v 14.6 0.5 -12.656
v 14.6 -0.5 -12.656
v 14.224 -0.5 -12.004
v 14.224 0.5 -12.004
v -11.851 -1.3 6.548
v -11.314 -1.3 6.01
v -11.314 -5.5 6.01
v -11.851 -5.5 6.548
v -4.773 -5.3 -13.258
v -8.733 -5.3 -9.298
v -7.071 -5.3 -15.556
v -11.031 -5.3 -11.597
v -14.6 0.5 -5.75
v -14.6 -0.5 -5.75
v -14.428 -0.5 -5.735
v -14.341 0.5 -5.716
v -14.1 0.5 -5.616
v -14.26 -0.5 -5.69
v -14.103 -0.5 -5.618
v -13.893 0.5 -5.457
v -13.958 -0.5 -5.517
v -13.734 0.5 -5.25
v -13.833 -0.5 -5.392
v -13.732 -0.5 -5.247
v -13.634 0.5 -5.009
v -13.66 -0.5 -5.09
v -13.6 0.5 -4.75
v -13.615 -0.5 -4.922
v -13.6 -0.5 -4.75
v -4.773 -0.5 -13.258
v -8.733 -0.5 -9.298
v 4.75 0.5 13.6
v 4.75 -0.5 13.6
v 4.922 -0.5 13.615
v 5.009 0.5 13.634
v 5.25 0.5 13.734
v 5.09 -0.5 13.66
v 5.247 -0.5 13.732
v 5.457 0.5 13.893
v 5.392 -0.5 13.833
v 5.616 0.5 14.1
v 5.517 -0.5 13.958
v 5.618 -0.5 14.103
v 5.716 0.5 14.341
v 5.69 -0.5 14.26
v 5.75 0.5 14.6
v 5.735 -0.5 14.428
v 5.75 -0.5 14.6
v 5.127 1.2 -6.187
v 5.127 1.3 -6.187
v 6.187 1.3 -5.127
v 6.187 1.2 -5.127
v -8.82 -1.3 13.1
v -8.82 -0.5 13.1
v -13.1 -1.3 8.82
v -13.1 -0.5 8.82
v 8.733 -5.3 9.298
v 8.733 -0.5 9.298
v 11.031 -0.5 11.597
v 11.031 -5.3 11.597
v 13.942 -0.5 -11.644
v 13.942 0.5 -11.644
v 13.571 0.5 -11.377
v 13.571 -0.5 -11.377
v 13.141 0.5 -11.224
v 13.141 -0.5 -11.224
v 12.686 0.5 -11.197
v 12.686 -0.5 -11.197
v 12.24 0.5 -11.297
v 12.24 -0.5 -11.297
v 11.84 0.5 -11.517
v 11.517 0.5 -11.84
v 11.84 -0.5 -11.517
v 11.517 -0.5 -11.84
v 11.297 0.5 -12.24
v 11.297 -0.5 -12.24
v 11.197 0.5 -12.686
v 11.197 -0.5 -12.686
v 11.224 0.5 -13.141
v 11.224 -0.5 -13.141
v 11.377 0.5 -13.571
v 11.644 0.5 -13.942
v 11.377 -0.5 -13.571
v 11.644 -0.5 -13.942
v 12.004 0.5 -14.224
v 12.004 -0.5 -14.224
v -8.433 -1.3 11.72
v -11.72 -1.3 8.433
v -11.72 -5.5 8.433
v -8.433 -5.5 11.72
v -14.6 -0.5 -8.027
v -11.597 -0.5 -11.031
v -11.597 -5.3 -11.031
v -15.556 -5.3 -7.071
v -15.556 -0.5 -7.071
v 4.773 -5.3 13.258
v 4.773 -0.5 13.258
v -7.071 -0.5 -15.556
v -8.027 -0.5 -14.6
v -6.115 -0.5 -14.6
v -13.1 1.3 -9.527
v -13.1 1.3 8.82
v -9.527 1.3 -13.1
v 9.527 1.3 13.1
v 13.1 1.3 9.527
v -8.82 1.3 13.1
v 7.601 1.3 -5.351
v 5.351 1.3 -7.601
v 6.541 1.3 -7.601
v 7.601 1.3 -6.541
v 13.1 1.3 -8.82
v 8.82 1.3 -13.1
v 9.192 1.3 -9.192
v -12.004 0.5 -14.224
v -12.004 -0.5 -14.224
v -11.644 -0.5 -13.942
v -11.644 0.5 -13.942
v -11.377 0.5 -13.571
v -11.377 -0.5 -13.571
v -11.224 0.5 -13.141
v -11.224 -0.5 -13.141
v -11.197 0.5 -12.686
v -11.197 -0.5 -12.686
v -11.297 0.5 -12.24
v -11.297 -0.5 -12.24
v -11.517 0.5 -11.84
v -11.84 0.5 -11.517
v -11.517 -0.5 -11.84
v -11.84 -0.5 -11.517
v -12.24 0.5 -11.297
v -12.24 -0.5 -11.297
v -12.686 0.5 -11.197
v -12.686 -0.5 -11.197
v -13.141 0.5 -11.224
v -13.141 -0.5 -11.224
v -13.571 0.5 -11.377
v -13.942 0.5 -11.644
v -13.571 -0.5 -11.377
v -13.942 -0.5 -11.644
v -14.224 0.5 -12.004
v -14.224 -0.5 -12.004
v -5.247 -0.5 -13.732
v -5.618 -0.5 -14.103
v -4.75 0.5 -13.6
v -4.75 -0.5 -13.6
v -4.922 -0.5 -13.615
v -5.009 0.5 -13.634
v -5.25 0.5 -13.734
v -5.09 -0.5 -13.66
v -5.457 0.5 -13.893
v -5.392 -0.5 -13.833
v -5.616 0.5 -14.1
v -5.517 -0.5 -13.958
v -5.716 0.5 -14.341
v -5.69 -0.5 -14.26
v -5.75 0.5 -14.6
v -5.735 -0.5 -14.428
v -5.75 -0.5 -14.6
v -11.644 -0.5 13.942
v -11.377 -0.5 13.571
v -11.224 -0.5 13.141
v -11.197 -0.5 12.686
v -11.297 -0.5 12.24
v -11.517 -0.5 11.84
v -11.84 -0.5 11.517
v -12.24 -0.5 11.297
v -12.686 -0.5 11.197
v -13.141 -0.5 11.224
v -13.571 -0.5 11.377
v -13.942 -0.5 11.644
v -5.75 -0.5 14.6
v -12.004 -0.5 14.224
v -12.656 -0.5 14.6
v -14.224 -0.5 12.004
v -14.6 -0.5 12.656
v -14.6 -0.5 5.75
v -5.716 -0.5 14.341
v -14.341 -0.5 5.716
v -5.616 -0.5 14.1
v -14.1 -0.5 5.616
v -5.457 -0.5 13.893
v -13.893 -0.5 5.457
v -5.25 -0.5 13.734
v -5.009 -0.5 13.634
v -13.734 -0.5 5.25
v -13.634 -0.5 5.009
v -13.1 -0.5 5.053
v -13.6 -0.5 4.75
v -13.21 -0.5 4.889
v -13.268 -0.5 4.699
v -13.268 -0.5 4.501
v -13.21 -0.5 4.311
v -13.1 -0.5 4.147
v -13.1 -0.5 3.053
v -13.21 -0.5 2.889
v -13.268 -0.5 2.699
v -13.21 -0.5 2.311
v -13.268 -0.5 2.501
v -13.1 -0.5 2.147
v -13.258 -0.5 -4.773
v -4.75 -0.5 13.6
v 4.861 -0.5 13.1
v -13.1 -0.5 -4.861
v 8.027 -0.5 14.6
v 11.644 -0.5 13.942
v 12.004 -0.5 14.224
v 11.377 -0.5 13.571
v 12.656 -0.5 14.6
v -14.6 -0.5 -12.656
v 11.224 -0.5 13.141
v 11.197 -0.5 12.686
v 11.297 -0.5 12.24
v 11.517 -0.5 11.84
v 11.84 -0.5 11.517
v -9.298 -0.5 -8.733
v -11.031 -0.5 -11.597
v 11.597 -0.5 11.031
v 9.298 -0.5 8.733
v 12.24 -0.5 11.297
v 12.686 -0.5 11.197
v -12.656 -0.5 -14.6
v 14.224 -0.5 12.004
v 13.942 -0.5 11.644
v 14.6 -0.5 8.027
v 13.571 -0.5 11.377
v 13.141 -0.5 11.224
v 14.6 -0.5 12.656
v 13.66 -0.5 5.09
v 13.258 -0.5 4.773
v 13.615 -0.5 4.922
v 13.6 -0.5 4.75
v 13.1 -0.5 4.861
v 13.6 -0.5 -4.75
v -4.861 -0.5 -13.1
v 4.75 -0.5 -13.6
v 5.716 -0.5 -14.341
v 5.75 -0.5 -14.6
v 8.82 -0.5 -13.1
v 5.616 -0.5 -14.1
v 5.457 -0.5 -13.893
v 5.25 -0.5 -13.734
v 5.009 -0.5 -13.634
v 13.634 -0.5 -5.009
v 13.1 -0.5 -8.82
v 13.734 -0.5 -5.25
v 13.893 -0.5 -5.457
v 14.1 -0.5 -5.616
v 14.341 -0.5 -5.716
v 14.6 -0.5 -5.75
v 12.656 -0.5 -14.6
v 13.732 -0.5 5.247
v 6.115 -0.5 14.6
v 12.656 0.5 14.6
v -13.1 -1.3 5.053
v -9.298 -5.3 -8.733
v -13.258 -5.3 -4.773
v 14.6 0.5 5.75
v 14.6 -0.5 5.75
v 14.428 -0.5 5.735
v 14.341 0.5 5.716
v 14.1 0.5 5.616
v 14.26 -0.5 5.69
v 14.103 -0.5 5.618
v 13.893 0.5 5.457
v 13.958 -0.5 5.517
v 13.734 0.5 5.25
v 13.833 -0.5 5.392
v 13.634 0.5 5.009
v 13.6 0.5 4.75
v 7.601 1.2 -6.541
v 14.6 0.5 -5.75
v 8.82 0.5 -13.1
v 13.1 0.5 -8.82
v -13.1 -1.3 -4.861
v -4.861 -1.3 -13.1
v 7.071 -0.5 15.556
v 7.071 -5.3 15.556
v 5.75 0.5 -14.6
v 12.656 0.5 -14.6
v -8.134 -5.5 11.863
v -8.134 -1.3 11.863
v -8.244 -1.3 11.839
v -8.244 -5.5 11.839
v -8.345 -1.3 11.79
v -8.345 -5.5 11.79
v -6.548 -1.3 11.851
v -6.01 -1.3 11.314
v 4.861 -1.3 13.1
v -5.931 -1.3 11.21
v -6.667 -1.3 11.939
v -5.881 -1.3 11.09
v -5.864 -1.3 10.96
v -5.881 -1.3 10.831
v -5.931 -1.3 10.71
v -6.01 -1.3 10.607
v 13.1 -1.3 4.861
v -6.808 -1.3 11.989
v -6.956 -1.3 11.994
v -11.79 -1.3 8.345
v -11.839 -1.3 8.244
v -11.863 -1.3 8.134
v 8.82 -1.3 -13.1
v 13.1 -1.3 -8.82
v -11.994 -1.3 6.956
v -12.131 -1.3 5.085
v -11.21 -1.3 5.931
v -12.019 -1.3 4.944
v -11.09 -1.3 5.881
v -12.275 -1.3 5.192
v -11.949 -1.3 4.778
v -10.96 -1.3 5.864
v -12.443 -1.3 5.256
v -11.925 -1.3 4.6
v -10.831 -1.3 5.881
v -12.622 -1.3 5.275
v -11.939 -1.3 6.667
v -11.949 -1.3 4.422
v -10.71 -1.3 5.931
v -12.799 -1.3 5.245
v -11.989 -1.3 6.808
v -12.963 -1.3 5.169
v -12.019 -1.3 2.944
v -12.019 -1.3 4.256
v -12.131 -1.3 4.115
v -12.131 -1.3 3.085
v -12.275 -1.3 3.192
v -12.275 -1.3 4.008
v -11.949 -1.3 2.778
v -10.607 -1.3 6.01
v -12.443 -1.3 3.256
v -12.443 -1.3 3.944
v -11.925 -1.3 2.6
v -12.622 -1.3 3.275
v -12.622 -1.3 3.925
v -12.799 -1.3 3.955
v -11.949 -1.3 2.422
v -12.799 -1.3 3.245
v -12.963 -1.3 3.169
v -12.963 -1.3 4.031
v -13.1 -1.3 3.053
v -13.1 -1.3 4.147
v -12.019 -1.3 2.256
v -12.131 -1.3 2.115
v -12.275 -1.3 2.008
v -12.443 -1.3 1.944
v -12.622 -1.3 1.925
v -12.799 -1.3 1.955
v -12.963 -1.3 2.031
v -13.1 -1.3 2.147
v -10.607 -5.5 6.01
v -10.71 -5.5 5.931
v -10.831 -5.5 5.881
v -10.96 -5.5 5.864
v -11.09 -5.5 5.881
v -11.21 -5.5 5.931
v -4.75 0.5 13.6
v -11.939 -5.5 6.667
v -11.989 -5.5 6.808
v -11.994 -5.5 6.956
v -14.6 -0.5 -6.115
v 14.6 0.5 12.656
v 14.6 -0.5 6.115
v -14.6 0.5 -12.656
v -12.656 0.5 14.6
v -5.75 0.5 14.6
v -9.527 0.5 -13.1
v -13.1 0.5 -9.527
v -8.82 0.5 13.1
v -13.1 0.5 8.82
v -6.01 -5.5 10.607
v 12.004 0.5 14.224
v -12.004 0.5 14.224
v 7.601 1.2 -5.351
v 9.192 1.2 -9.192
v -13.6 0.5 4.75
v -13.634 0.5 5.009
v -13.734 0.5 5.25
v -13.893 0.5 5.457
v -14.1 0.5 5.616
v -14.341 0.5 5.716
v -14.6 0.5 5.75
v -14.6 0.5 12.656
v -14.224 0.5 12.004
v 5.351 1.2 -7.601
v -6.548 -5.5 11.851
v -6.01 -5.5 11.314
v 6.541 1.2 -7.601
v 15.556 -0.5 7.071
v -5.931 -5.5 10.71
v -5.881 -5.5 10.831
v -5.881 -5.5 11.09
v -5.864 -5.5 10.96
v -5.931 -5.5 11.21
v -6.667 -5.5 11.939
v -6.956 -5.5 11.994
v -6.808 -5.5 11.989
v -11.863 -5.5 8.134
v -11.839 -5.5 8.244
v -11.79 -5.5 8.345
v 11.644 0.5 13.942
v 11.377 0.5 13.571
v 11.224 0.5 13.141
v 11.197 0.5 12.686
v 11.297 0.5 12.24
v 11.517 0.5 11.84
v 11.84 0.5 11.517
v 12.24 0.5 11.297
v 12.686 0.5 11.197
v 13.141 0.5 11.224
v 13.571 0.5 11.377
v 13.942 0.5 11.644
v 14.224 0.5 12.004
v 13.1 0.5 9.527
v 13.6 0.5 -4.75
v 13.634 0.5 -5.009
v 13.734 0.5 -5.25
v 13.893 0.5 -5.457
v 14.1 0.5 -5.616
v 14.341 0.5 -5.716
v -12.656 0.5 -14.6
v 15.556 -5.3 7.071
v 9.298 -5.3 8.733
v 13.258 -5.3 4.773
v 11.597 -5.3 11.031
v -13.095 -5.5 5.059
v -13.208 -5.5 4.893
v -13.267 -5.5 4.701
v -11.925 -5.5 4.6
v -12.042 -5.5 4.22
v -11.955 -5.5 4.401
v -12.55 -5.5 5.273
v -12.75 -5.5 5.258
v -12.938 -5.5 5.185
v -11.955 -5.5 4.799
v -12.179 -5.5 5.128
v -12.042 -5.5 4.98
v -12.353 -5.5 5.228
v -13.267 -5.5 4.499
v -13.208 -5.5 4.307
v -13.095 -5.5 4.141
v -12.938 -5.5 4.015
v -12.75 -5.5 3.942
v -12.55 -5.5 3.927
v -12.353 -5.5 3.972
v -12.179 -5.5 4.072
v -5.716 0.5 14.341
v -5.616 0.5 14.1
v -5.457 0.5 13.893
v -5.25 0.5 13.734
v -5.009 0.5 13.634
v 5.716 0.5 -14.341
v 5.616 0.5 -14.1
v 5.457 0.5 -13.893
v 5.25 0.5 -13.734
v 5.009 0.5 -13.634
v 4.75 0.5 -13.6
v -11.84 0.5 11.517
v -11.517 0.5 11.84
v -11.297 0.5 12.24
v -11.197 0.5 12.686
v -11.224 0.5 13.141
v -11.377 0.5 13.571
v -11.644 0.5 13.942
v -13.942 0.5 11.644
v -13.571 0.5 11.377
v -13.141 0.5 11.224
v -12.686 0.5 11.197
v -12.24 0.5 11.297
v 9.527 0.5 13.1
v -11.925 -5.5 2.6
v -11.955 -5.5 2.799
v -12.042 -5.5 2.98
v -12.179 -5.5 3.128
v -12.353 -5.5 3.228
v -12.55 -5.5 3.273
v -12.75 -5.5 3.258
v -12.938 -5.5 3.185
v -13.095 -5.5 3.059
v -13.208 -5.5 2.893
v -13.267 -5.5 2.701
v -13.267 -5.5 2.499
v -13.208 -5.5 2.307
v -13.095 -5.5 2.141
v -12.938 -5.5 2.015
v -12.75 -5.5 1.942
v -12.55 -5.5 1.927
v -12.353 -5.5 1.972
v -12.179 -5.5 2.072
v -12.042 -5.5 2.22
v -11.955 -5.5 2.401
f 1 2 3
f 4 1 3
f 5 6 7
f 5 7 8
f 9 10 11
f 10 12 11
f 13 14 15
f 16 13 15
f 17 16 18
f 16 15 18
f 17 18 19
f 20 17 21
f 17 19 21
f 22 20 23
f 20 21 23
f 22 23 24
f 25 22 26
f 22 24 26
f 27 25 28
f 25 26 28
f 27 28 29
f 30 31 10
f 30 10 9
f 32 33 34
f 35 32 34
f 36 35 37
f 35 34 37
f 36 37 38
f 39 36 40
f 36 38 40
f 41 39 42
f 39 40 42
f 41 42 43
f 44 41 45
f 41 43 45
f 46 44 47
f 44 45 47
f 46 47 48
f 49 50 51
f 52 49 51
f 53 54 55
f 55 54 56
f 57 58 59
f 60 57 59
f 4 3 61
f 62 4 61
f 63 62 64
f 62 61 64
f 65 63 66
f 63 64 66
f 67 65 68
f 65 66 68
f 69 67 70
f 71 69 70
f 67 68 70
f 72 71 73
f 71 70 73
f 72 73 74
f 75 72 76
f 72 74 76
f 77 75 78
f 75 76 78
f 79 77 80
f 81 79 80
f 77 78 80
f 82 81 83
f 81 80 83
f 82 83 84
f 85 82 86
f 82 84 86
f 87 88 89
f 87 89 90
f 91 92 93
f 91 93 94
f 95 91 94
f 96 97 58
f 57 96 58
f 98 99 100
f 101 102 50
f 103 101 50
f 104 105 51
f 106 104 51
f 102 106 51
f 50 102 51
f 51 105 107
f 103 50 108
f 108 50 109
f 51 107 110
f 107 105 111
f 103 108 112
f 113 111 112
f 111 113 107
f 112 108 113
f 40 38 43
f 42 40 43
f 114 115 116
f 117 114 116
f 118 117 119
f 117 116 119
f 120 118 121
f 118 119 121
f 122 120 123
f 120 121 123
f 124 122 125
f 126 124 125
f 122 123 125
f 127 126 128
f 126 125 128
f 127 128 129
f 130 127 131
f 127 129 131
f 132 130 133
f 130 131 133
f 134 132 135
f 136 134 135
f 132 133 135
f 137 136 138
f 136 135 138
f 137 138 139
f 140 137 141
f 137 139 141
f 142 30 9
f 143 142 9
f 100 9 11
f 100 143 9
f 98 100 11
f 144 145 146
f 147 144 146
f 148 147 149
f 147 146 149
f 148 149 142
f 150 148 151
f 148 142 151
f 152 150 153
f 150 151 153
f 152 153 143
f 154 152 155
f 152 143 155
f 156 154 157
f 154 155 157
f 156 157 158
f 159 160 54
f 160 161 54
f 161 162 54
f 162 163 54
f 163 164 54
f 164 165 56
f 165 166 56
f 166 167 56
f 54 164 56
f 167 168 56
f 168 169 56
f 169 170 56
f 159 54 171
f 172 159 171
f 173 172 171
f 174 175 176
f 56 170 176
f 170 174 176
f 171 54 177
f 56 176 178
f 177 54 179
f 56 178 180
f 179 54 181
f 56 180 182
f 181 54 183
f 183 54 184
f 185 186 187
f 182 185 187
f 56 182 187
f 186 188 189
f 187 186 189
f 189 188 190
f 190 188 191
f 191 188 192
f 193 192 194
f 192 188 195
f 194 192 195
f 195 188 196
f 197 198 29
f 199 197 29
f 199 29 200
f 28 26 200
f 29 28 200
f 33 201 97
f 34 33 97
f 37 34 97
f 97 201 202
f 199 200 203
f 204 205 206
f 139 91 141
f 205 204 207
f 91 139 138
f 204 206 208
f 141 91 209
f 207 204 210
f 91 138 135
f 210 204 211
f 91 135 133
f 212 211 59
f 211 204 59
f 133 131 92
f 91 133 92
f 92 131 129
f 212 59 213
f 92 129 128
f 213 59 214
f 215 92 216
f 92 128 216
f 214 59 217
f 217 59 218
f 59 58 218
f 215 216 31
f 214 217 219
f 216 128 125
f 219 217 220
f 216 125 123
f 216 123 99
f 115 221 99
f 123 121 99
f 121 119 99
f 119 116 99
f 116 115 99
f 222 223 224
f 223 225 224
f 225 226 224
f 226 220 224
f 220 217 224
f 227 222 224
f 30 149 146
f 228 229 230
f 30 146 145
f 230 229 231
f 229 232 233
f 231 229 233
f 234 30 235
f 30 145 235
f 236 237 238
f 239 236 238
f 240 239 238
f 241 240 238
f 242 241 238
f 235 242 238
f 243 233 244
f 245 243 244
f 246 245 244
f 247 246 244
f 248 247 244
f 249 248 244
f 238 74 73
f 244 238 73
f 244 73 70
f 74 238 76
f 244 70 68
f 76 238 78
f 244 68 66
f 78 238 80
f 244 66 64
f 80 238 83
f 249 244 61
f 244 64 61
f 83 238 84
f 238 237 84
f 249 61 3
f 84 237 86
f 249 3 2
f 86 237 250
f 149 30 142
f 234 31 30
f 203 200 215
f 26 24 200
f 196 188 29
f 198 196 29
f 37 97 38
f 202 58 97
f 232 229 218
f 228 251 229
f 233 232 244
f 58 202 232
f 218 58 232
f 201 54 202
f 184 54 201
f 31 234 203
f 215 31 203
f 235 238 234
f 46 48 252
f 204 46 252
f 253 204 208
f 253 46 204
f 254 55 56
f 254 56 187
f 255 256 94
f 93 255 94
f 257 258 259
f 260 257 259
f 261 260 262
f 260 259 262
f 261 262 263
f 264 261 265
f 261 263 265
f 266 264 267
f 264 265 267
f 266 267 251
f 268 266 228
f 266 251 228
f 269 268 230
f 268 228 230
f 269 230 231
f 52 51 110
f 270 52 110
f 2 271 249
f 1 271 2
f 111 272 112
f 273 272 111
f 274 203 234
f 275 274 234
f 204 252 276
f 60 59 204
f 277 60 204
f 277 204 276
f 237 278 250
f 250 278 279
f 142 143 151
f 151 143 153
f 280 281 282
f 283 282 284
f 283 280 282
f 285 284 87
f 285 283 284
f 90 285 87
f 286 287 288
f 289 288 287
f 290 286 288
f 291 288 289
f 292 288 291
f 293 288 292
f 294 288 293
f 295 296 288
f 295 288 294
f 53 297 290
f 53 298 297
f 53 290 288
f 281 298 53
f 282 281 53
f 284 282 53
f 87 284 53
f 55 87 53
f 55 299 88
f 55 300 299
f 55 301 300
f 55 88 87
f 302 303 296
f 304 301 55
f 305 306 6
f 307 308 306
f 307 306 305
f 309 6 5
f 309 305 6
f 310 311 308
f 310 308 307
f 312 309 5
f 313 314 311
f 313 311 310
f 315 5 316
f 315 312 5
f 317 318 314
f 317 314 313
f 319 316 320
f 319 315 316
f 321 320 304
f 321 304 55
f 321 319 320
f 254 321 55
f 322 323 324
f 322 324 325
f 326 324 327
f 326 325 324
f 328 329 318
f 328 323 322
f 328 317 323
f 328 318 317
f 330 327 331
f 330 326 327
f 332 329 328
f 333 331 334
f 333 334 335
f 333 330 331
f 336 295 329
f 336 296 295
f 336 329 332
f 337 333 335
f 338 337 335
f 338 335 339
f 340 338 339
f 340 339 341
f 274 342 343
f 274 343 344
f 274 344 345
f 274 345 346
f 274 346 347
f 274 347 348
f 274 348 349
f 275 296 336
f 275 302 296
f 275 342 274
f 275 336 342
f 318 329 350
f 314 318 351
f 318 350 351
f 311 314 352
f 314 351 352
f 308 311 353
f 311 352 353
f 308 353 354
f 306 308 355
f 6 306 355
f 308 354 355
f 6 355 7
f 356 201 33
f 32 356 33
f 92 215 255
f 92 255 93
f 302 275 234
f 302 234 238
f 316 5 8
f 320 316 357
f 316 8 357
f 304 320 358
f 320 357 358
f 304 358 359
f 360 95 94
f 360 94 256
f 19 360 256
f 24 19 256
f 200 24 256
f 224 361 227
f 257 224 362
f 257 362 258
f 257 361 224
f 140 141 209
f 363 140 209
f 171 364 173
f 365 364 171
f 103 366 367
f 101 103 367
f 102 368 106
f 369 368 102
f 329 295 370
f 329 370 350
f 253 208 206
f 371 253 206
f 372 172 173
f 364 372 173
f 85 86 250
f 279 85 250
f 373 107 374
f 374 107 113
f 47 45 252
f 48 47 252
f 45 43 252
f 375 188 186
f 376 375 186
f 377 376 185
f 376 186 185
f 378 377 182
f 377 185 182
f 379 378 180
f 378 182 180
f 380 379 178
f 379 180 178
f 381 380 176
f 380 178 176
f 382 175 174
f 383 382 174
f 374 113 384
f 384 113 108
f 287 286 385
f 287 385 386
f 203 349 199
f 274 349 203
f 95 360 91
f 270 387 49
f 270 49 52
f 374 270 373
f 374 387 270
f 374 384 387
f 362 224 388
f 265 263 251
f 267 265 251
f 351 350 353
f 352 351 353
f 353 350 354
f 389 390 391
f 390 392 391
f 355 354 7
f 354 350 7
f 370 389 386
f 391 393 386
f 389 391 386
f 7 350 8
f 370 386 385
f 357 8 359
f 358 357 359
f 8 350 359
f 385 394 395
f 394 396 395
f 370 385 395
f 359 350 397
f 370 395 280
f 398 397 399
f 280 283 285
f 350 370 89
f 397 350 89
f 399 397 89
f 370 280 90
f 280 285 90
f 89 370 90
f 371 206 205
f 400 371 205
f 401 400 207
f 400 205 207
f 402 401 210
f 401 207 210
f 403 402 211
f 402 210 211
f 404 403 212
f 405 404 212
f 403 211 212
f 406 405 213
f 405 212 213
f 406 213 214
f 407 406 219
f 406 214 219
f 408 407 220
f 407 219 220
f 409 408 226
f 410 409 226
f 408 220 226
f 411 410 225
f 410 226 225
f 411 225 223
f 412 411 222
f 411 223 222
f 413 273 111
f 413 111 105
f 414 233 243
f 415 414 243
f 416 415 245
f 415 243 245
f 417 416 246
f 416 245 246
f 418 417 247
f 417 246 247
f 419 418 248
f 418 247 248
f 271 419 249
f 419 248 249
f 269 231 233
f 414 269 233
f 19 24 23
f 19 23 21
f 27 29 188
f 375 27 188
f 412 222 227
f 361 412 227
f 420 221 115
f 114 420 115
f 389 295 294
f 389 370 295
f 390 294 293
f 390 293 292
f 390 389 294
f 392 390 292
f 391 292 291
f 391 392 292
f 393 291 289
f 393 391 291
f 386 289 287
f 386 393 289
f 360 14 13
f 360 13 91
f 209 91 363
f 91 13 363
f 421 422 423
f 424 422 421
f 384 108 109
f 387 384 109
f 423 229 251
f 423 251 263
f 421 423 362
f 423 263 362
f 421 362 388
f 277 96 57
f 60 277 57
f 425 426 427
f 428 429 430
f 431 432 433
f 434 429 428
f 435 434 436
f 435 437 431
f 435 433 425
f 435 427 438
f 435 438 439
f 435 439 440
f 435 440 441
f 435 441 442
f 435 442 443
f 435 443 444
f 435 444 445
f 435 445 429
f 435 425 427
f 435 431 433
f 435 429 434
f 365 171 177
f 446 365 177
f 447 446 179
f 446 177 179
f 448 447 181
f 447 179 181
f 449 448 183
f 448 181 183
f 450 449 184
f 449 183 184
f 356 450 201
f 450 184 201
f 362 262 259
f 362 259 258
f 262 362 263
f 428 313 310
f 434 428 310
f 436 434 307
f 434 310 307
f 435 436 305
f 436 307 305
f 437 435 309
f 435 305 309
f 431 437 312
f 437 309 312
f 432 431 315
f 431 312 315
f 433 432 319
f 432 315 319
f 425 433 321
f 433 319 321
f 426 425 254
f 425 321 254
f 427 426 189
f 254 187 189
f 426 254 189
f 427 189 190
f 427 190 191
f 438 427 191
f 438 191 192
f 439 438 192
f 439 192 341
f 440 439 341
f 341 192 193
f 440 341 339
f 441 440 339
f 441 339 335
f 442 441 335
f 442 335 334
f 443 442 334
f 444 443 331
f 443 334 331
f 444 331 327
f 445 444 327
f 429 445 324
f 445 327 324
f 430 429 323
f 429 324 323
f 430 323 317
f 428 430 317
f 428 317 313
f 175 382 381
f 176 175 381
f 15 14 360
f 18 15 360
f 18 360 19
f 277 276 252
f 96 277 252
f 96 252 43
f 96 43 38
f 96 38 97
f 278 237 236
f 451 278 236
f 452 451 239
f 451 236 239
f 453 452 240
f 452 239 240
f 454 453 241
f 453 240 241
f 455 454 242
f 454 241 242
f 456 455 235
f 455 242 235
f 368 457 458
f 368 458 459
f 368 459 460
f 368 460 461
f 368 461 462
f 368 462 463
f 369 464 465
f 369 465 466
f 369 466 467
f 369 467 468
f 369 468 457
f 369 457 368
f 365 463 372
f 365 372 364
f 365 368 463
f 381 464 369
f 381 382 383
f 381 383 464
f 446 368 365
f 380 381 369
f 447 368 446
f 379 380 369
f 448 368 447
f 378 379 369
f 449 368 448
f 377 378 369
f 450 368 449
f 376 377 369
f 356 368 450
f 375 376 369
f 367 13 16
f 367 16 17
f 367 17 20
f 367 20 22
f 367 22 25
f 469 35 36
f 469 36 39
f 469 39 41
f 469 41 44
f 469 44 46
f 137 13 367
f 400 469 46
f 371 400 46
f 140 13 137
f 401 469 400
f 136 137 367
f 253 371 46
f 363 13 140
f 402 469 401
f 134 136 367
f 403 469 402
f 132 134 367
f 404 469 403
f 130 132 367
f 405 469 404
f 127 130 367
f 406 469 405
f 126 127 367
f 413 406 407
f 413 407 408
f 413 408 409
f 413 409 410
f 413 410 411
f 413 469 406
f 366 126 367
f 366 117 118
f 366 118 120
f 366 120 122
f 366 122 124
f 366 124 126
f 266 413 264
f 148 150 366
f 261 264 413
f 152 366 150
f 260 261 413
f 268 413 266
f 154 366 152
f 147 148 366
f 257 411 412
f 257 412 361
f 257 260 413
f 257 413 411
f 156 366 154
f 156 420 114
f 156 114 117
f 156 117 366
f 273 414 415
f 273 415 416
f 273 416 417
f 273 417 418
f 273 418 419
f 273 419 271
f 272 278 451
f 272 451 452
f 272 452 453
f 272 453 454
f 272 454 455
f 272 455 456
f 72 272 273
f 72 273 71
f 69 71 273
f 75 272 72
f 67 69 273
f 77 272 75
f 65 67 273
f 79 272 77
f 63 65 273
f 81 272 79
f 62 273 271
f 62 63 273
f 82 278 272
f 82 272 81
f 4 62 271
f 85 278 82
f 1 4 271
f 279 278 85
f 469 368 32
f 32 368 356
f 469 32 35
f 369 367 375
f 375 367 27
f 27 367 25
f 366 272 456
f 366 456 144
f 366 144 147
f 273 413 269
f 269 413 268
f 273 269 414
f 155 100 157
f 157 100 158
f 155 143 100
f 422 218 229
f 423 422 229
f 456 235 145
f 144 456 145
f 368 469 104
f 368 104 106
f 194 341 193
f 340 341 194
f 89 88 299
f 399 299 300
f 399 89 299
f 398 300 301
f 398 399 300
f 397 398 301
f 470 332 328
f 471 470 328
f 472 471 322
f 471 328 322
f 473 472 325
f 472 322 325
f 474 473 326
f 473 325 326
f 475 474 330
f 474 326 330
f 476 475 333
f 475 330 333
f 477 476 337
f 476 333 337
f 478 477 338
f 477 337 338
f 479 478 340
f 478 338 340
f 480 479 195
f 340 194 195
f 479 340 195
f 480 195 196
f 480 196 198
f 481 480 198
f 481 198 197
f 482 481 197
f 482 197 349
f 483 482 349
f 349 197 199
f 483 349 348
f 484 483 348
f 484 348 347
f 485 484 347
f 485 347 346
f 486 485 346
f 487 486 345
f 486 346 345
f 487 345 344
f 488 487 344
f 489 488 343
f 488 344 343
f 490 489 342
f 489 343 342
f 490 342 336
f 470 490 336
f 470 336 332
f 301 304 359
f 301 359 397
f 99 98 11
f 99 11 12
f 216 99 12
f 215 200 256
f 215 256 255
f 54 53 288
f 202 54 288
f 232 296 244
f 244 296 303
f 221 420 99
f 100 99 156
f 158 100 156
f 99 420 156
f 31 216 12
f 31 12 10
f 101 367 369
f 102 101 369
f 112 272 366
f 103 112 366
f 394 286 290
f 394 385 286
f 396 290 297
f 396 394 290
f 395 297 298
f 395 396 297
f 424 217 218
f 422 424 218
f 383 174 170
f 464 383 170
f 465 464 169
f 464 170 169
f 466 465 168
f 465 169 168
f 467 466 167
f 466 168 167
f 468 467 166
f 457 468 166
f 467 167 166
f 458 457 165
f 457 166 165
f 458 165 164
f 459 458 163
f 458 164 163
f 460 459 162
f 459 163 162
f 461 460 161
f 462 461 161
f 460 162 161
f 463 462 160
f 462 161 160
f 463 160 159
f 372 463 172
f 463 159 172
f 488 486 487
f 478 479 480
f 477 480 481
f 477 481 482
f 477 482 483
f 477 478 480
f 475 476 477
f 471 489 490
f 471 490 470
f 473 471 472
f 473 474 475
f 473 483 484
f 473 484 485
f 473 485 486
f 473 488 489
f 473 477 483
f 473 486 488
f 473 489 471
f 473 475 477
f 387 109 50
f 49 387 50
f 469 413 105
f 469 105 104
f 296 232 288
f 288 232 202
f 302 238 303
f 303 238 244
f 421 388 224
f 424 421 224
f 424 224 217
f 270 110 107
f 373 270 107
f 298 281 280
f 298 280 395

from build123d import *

# Parameters (mm, degrees)
SKETCH1_W            = 29.2
SKETCH1_H            = 29.2
BOSS_EXTRUDE1_DEPTH  = 0.5
CUT_EXTRUDE1_START   = -2
CUT_EXTRUDE1_DEPTH   = 3
BOSS_EXTRUDE3_DEPTH  = 0.8
CUT_EXTRUDE4_START   = -1.5
CUT_EXTRUDE4_DEPTH   = 3.8
SKETCH10_OUTSIDE_W   = 53.166
SKETCH10_OUTSIDE_H   = 53.166
SKETCH10_OUTSIDE_W_2 = 26.2
SKETCH10_OUTSIDE_H_2 = 26.2
CUT_EXTRUDE9_DEPTH   = 0.8
CIRPATTERN1_COUNT    = 4
BOSS_EXTRUDE2_DEPTH  = 4.8
BOSS_EXTRUDE4_DEPTH  = 0.8
CUT_EXTRUDE10_DEPTH  = 0.1
BOSS_EXTRUDE5_DEPTH  = 5
FILLET1_R            = 0.5
SKETCH14_R           = 0.675
BOSS_EXTRUDE7_DEPTH  = 5


with BuildPart() as part:
    # Sketch1 → Boss-Extrude1 (new body, symmetric)
    with BuildSketch(Plane(origin=(0, 0, 0), x_dir=(1, 0, 0), z_dir=(0, 1, 0))):
        Rectangle(SKETCH1_W, SKETCH1_H)
    extrude(amount=BOSS_EXTRUDE1_DEPTH, both=True)

    # Sketch2 → Cut-Extrude1 (cut)
    with BuildSketch(Plane(origin=(0, 0.5, 0), x_dir=(1, 0, 0), z_dir=(0, 1, 0)).offset(CUT_EXTRUDE1_START)):
        with BuildLine():
            Line((-13.6, 4.75), (-13.6, -4.75))
            ThreePointArc((-13.6, -4.75), (-14.6, -5.75), (-15.6, -4.75))
            Line((-15.6, -4.75), (-15.6, 4.75))
            ThreePointArc((-15.6, 4.75), (-14.6, 5.75), (-13.6, 4.75))
        make_face()
    cut_extrude1 = extrude(amount=CUT_EXTRUDE1_DEPTH, mode=Mode.SUBTRACT)

    # Sketch6 → Boss-Extrude3 (add)
    with BuildSketch(Plane(origin=(0, 0.5, 0), x_dir=(1, 0, 0), z_dir=(0, 1, 0))):
        Polygon((19.940411229, 1.979898987), (-1.979898987, -19.940411229), (-19.940411229, -1.979898987), (1.979898987, 19.940411229), align=None)
    boss_extrude3 = extrude(amount=BOSS_EXTRUDE3_DEPTH)

    # Sketch4 → Cut-Extrude4 (cut)
    with BuildSketch(Plane(origin=(0, 0, 0), x_dir=(1, 0, 0), z_dir=(0, 1, 0)).offset(CUT_EXTRUDE4_START)):
        with BuildLine():
            Line((-14.22360169, 12.003810409), (-14.6, 12.655751406))
            Line((-14.6, 12.655751406), (-14.6, 14.6))
            Line((-14.6, 14.6), (-12.655751406, 14.6))
            Line((-12.655751406, 14.6), (-12.003810409, 14.22360169))
            ThreePointArc((-12.003810409, 14.22360169), (-11.66726189, 11.66726189), (-14.22360169, 12.003810409))
        make_face()
    cut_extrude4 = extrude(amount=CUT_EXTRUDE4_DEPTH, mode=Mode.SUBTRACT)

    # Sketch10 outside → Cut-Extrude9 (cut)
    with BuildSketch(Plane(origin=(0, 1.3, 0), x_dir=(1, 0, 0), z_dir=(0, 1, 0))):
        Rectangle(SKETCH10_OUTSIDE_W, SKETCH10_OUTSIDE_H)
        Rectangle(SKETCH10_OUTSIDE_W_2, SKETCH10_OUTSIDE_H_2, mode=Mode.SUBTRACT)
    cut_extrude9 = extrude(amount=-CUT_EXTRUDE9_DEPTH, mode=Mode.SUBTRACT)

    # CirPattern1: Cut-Extrude1, Cut-Extrude4 ×4 about axis
    cirpattern1_axis = Axis((0, 0, 0), (0, 1, 0))
    for i in range(1, CIRPATTERN1_COUNT):
        add(cut_extrude1.rotate(cirpattern1_axis, i * 360 / CIRPATTERN1_COUNT), mode=Mode.SUBTRACT)
        add(cut_extrude4.rotate(cirpattern1_axis, i * 360 / CIRPATTERN1_COUNT), mode=Mode.SUBTRACT)

    # Mirror3: Boss-Extrude3, Cut-Extrude9 across plane
    add(boss_extrude3.mirror(Plane.ZX))
    add(cut_extrude9.mirror(Plane.ZX), mode=Mode.SUBTRACT)

    # Sketch5 → Boss-Extrude2 (add)
    with BuildSketch(Plane.XZ.offset(0.5)):
        Polygon((4.772970773, 13.258252147), (8.732768748, 9.298454173), (11.030865787, 11.596551211), (7.071067812, 15.556349186), align=None)
        Polygon((9.298454173, 8.732768748), (13.258252147, 4.772970773), (15.556349186, 7.071067812), (11.596551211, 11.030865787), align=None)
    boss_extrude2 = extrude(amount=BOSS_EXTRUDE2_DEPTH)

    # Mirror1: Boss-Extrude2 across plane
    add(boss_extrude2.mirror(Plane(origin=(0, 0, 0), x_dir=(-0.707106781, 0, 0.707106781), z_dir=(0.707106781, 0, 0.707106781))))

    # Sketch11 → Boss-Extrude4 (add)
    with BuildSketch(Plane(origin=(0, 0.5, 0), x_dir=(1, 0, 0), z_dir=(0, 1, 0))):
        Polygon((-4.860512242, 13.1), (-9.527416998, 13.1), (-13.1, 9.527416998), (-13.1, 4.860512242), align=None)
    boss_extrude4 = extrude(amount=BOSS_EXTRUDE4_DEPTH)

    # Mirror4: Boss-Extrude4 across plane
    add(boss_extrude4.mirror(Plane(origin=(0, 0, 0), x_dir=(-0.707106781, 0, 0.707106781), z_dir=(0.707106781, 0, 0.707106781))))

    # Sketch12 → Cut-Extrude10 (cut)
    with BuildSketch(Plane(origin=(0, 1.3, 0), x_dir=(1, 0, 0), z_dir=(0, 1, 0))):
        Polygon((9.192388155, 9.192388155), (5.351397898, 7.601397898), (6.540737726, 7.601397898), (5.126524164, 6.187184335), (6.187184335, 5.126524164), (7.601397898, 6.540737726), (7.601397898, 5.351397898), align=None)
    extrude(amount=-CUT_EXTRUDE10_DEPTH, mode=Mode.SUBTRACT)

    # Sketch13 → Boss-Extrude5 (add)
    with BuildSketch(Plane.XZ.offset(0.5)):
        Polygon((-5.656854249, 10.960155108), (-10.960155108, 5.656854249), (-12.02081528, 6.717514421), (-11.844038585, 8.308504679), (-8.308504679, 11.844038585), (-6.717514421, 12.02081528), align=None)
    extrude(amount=BOSS_EXTRUDE5_DEPTH)

    # Fillet1
    fillet1_edges = [part.edges().sort_by_distance(p)[0] for p in [
        (-5.656854249, -3.4, 10.960155108),
        (-6.717514421, -3.4, 12.02081528),
        (-8.308504679, -3.4, 11.844038585),
        (-11.844038585, -3.4, 8.308504679),
        (-12.02081528, -3.4, 6.717514421),
        (-10.960155108, -3.4, 5.656854249),
    ]]
    fillet(fillet1_edges, radius=FILLET1_R)

    # Sketch14 → Boss-Extrude7 (add)
    with BuildSketch(Plane.XZ.offset(0.5)):
        with Locations((-12.6, 2.6)):
            Circle(SKETCH14_R)
        with Locations((-12.6, 4.6)):
            Circle(SKETCH14_R)
    extrude(amount=BOSS_EXTRUDE7_DEPTH)


solid = part.part
